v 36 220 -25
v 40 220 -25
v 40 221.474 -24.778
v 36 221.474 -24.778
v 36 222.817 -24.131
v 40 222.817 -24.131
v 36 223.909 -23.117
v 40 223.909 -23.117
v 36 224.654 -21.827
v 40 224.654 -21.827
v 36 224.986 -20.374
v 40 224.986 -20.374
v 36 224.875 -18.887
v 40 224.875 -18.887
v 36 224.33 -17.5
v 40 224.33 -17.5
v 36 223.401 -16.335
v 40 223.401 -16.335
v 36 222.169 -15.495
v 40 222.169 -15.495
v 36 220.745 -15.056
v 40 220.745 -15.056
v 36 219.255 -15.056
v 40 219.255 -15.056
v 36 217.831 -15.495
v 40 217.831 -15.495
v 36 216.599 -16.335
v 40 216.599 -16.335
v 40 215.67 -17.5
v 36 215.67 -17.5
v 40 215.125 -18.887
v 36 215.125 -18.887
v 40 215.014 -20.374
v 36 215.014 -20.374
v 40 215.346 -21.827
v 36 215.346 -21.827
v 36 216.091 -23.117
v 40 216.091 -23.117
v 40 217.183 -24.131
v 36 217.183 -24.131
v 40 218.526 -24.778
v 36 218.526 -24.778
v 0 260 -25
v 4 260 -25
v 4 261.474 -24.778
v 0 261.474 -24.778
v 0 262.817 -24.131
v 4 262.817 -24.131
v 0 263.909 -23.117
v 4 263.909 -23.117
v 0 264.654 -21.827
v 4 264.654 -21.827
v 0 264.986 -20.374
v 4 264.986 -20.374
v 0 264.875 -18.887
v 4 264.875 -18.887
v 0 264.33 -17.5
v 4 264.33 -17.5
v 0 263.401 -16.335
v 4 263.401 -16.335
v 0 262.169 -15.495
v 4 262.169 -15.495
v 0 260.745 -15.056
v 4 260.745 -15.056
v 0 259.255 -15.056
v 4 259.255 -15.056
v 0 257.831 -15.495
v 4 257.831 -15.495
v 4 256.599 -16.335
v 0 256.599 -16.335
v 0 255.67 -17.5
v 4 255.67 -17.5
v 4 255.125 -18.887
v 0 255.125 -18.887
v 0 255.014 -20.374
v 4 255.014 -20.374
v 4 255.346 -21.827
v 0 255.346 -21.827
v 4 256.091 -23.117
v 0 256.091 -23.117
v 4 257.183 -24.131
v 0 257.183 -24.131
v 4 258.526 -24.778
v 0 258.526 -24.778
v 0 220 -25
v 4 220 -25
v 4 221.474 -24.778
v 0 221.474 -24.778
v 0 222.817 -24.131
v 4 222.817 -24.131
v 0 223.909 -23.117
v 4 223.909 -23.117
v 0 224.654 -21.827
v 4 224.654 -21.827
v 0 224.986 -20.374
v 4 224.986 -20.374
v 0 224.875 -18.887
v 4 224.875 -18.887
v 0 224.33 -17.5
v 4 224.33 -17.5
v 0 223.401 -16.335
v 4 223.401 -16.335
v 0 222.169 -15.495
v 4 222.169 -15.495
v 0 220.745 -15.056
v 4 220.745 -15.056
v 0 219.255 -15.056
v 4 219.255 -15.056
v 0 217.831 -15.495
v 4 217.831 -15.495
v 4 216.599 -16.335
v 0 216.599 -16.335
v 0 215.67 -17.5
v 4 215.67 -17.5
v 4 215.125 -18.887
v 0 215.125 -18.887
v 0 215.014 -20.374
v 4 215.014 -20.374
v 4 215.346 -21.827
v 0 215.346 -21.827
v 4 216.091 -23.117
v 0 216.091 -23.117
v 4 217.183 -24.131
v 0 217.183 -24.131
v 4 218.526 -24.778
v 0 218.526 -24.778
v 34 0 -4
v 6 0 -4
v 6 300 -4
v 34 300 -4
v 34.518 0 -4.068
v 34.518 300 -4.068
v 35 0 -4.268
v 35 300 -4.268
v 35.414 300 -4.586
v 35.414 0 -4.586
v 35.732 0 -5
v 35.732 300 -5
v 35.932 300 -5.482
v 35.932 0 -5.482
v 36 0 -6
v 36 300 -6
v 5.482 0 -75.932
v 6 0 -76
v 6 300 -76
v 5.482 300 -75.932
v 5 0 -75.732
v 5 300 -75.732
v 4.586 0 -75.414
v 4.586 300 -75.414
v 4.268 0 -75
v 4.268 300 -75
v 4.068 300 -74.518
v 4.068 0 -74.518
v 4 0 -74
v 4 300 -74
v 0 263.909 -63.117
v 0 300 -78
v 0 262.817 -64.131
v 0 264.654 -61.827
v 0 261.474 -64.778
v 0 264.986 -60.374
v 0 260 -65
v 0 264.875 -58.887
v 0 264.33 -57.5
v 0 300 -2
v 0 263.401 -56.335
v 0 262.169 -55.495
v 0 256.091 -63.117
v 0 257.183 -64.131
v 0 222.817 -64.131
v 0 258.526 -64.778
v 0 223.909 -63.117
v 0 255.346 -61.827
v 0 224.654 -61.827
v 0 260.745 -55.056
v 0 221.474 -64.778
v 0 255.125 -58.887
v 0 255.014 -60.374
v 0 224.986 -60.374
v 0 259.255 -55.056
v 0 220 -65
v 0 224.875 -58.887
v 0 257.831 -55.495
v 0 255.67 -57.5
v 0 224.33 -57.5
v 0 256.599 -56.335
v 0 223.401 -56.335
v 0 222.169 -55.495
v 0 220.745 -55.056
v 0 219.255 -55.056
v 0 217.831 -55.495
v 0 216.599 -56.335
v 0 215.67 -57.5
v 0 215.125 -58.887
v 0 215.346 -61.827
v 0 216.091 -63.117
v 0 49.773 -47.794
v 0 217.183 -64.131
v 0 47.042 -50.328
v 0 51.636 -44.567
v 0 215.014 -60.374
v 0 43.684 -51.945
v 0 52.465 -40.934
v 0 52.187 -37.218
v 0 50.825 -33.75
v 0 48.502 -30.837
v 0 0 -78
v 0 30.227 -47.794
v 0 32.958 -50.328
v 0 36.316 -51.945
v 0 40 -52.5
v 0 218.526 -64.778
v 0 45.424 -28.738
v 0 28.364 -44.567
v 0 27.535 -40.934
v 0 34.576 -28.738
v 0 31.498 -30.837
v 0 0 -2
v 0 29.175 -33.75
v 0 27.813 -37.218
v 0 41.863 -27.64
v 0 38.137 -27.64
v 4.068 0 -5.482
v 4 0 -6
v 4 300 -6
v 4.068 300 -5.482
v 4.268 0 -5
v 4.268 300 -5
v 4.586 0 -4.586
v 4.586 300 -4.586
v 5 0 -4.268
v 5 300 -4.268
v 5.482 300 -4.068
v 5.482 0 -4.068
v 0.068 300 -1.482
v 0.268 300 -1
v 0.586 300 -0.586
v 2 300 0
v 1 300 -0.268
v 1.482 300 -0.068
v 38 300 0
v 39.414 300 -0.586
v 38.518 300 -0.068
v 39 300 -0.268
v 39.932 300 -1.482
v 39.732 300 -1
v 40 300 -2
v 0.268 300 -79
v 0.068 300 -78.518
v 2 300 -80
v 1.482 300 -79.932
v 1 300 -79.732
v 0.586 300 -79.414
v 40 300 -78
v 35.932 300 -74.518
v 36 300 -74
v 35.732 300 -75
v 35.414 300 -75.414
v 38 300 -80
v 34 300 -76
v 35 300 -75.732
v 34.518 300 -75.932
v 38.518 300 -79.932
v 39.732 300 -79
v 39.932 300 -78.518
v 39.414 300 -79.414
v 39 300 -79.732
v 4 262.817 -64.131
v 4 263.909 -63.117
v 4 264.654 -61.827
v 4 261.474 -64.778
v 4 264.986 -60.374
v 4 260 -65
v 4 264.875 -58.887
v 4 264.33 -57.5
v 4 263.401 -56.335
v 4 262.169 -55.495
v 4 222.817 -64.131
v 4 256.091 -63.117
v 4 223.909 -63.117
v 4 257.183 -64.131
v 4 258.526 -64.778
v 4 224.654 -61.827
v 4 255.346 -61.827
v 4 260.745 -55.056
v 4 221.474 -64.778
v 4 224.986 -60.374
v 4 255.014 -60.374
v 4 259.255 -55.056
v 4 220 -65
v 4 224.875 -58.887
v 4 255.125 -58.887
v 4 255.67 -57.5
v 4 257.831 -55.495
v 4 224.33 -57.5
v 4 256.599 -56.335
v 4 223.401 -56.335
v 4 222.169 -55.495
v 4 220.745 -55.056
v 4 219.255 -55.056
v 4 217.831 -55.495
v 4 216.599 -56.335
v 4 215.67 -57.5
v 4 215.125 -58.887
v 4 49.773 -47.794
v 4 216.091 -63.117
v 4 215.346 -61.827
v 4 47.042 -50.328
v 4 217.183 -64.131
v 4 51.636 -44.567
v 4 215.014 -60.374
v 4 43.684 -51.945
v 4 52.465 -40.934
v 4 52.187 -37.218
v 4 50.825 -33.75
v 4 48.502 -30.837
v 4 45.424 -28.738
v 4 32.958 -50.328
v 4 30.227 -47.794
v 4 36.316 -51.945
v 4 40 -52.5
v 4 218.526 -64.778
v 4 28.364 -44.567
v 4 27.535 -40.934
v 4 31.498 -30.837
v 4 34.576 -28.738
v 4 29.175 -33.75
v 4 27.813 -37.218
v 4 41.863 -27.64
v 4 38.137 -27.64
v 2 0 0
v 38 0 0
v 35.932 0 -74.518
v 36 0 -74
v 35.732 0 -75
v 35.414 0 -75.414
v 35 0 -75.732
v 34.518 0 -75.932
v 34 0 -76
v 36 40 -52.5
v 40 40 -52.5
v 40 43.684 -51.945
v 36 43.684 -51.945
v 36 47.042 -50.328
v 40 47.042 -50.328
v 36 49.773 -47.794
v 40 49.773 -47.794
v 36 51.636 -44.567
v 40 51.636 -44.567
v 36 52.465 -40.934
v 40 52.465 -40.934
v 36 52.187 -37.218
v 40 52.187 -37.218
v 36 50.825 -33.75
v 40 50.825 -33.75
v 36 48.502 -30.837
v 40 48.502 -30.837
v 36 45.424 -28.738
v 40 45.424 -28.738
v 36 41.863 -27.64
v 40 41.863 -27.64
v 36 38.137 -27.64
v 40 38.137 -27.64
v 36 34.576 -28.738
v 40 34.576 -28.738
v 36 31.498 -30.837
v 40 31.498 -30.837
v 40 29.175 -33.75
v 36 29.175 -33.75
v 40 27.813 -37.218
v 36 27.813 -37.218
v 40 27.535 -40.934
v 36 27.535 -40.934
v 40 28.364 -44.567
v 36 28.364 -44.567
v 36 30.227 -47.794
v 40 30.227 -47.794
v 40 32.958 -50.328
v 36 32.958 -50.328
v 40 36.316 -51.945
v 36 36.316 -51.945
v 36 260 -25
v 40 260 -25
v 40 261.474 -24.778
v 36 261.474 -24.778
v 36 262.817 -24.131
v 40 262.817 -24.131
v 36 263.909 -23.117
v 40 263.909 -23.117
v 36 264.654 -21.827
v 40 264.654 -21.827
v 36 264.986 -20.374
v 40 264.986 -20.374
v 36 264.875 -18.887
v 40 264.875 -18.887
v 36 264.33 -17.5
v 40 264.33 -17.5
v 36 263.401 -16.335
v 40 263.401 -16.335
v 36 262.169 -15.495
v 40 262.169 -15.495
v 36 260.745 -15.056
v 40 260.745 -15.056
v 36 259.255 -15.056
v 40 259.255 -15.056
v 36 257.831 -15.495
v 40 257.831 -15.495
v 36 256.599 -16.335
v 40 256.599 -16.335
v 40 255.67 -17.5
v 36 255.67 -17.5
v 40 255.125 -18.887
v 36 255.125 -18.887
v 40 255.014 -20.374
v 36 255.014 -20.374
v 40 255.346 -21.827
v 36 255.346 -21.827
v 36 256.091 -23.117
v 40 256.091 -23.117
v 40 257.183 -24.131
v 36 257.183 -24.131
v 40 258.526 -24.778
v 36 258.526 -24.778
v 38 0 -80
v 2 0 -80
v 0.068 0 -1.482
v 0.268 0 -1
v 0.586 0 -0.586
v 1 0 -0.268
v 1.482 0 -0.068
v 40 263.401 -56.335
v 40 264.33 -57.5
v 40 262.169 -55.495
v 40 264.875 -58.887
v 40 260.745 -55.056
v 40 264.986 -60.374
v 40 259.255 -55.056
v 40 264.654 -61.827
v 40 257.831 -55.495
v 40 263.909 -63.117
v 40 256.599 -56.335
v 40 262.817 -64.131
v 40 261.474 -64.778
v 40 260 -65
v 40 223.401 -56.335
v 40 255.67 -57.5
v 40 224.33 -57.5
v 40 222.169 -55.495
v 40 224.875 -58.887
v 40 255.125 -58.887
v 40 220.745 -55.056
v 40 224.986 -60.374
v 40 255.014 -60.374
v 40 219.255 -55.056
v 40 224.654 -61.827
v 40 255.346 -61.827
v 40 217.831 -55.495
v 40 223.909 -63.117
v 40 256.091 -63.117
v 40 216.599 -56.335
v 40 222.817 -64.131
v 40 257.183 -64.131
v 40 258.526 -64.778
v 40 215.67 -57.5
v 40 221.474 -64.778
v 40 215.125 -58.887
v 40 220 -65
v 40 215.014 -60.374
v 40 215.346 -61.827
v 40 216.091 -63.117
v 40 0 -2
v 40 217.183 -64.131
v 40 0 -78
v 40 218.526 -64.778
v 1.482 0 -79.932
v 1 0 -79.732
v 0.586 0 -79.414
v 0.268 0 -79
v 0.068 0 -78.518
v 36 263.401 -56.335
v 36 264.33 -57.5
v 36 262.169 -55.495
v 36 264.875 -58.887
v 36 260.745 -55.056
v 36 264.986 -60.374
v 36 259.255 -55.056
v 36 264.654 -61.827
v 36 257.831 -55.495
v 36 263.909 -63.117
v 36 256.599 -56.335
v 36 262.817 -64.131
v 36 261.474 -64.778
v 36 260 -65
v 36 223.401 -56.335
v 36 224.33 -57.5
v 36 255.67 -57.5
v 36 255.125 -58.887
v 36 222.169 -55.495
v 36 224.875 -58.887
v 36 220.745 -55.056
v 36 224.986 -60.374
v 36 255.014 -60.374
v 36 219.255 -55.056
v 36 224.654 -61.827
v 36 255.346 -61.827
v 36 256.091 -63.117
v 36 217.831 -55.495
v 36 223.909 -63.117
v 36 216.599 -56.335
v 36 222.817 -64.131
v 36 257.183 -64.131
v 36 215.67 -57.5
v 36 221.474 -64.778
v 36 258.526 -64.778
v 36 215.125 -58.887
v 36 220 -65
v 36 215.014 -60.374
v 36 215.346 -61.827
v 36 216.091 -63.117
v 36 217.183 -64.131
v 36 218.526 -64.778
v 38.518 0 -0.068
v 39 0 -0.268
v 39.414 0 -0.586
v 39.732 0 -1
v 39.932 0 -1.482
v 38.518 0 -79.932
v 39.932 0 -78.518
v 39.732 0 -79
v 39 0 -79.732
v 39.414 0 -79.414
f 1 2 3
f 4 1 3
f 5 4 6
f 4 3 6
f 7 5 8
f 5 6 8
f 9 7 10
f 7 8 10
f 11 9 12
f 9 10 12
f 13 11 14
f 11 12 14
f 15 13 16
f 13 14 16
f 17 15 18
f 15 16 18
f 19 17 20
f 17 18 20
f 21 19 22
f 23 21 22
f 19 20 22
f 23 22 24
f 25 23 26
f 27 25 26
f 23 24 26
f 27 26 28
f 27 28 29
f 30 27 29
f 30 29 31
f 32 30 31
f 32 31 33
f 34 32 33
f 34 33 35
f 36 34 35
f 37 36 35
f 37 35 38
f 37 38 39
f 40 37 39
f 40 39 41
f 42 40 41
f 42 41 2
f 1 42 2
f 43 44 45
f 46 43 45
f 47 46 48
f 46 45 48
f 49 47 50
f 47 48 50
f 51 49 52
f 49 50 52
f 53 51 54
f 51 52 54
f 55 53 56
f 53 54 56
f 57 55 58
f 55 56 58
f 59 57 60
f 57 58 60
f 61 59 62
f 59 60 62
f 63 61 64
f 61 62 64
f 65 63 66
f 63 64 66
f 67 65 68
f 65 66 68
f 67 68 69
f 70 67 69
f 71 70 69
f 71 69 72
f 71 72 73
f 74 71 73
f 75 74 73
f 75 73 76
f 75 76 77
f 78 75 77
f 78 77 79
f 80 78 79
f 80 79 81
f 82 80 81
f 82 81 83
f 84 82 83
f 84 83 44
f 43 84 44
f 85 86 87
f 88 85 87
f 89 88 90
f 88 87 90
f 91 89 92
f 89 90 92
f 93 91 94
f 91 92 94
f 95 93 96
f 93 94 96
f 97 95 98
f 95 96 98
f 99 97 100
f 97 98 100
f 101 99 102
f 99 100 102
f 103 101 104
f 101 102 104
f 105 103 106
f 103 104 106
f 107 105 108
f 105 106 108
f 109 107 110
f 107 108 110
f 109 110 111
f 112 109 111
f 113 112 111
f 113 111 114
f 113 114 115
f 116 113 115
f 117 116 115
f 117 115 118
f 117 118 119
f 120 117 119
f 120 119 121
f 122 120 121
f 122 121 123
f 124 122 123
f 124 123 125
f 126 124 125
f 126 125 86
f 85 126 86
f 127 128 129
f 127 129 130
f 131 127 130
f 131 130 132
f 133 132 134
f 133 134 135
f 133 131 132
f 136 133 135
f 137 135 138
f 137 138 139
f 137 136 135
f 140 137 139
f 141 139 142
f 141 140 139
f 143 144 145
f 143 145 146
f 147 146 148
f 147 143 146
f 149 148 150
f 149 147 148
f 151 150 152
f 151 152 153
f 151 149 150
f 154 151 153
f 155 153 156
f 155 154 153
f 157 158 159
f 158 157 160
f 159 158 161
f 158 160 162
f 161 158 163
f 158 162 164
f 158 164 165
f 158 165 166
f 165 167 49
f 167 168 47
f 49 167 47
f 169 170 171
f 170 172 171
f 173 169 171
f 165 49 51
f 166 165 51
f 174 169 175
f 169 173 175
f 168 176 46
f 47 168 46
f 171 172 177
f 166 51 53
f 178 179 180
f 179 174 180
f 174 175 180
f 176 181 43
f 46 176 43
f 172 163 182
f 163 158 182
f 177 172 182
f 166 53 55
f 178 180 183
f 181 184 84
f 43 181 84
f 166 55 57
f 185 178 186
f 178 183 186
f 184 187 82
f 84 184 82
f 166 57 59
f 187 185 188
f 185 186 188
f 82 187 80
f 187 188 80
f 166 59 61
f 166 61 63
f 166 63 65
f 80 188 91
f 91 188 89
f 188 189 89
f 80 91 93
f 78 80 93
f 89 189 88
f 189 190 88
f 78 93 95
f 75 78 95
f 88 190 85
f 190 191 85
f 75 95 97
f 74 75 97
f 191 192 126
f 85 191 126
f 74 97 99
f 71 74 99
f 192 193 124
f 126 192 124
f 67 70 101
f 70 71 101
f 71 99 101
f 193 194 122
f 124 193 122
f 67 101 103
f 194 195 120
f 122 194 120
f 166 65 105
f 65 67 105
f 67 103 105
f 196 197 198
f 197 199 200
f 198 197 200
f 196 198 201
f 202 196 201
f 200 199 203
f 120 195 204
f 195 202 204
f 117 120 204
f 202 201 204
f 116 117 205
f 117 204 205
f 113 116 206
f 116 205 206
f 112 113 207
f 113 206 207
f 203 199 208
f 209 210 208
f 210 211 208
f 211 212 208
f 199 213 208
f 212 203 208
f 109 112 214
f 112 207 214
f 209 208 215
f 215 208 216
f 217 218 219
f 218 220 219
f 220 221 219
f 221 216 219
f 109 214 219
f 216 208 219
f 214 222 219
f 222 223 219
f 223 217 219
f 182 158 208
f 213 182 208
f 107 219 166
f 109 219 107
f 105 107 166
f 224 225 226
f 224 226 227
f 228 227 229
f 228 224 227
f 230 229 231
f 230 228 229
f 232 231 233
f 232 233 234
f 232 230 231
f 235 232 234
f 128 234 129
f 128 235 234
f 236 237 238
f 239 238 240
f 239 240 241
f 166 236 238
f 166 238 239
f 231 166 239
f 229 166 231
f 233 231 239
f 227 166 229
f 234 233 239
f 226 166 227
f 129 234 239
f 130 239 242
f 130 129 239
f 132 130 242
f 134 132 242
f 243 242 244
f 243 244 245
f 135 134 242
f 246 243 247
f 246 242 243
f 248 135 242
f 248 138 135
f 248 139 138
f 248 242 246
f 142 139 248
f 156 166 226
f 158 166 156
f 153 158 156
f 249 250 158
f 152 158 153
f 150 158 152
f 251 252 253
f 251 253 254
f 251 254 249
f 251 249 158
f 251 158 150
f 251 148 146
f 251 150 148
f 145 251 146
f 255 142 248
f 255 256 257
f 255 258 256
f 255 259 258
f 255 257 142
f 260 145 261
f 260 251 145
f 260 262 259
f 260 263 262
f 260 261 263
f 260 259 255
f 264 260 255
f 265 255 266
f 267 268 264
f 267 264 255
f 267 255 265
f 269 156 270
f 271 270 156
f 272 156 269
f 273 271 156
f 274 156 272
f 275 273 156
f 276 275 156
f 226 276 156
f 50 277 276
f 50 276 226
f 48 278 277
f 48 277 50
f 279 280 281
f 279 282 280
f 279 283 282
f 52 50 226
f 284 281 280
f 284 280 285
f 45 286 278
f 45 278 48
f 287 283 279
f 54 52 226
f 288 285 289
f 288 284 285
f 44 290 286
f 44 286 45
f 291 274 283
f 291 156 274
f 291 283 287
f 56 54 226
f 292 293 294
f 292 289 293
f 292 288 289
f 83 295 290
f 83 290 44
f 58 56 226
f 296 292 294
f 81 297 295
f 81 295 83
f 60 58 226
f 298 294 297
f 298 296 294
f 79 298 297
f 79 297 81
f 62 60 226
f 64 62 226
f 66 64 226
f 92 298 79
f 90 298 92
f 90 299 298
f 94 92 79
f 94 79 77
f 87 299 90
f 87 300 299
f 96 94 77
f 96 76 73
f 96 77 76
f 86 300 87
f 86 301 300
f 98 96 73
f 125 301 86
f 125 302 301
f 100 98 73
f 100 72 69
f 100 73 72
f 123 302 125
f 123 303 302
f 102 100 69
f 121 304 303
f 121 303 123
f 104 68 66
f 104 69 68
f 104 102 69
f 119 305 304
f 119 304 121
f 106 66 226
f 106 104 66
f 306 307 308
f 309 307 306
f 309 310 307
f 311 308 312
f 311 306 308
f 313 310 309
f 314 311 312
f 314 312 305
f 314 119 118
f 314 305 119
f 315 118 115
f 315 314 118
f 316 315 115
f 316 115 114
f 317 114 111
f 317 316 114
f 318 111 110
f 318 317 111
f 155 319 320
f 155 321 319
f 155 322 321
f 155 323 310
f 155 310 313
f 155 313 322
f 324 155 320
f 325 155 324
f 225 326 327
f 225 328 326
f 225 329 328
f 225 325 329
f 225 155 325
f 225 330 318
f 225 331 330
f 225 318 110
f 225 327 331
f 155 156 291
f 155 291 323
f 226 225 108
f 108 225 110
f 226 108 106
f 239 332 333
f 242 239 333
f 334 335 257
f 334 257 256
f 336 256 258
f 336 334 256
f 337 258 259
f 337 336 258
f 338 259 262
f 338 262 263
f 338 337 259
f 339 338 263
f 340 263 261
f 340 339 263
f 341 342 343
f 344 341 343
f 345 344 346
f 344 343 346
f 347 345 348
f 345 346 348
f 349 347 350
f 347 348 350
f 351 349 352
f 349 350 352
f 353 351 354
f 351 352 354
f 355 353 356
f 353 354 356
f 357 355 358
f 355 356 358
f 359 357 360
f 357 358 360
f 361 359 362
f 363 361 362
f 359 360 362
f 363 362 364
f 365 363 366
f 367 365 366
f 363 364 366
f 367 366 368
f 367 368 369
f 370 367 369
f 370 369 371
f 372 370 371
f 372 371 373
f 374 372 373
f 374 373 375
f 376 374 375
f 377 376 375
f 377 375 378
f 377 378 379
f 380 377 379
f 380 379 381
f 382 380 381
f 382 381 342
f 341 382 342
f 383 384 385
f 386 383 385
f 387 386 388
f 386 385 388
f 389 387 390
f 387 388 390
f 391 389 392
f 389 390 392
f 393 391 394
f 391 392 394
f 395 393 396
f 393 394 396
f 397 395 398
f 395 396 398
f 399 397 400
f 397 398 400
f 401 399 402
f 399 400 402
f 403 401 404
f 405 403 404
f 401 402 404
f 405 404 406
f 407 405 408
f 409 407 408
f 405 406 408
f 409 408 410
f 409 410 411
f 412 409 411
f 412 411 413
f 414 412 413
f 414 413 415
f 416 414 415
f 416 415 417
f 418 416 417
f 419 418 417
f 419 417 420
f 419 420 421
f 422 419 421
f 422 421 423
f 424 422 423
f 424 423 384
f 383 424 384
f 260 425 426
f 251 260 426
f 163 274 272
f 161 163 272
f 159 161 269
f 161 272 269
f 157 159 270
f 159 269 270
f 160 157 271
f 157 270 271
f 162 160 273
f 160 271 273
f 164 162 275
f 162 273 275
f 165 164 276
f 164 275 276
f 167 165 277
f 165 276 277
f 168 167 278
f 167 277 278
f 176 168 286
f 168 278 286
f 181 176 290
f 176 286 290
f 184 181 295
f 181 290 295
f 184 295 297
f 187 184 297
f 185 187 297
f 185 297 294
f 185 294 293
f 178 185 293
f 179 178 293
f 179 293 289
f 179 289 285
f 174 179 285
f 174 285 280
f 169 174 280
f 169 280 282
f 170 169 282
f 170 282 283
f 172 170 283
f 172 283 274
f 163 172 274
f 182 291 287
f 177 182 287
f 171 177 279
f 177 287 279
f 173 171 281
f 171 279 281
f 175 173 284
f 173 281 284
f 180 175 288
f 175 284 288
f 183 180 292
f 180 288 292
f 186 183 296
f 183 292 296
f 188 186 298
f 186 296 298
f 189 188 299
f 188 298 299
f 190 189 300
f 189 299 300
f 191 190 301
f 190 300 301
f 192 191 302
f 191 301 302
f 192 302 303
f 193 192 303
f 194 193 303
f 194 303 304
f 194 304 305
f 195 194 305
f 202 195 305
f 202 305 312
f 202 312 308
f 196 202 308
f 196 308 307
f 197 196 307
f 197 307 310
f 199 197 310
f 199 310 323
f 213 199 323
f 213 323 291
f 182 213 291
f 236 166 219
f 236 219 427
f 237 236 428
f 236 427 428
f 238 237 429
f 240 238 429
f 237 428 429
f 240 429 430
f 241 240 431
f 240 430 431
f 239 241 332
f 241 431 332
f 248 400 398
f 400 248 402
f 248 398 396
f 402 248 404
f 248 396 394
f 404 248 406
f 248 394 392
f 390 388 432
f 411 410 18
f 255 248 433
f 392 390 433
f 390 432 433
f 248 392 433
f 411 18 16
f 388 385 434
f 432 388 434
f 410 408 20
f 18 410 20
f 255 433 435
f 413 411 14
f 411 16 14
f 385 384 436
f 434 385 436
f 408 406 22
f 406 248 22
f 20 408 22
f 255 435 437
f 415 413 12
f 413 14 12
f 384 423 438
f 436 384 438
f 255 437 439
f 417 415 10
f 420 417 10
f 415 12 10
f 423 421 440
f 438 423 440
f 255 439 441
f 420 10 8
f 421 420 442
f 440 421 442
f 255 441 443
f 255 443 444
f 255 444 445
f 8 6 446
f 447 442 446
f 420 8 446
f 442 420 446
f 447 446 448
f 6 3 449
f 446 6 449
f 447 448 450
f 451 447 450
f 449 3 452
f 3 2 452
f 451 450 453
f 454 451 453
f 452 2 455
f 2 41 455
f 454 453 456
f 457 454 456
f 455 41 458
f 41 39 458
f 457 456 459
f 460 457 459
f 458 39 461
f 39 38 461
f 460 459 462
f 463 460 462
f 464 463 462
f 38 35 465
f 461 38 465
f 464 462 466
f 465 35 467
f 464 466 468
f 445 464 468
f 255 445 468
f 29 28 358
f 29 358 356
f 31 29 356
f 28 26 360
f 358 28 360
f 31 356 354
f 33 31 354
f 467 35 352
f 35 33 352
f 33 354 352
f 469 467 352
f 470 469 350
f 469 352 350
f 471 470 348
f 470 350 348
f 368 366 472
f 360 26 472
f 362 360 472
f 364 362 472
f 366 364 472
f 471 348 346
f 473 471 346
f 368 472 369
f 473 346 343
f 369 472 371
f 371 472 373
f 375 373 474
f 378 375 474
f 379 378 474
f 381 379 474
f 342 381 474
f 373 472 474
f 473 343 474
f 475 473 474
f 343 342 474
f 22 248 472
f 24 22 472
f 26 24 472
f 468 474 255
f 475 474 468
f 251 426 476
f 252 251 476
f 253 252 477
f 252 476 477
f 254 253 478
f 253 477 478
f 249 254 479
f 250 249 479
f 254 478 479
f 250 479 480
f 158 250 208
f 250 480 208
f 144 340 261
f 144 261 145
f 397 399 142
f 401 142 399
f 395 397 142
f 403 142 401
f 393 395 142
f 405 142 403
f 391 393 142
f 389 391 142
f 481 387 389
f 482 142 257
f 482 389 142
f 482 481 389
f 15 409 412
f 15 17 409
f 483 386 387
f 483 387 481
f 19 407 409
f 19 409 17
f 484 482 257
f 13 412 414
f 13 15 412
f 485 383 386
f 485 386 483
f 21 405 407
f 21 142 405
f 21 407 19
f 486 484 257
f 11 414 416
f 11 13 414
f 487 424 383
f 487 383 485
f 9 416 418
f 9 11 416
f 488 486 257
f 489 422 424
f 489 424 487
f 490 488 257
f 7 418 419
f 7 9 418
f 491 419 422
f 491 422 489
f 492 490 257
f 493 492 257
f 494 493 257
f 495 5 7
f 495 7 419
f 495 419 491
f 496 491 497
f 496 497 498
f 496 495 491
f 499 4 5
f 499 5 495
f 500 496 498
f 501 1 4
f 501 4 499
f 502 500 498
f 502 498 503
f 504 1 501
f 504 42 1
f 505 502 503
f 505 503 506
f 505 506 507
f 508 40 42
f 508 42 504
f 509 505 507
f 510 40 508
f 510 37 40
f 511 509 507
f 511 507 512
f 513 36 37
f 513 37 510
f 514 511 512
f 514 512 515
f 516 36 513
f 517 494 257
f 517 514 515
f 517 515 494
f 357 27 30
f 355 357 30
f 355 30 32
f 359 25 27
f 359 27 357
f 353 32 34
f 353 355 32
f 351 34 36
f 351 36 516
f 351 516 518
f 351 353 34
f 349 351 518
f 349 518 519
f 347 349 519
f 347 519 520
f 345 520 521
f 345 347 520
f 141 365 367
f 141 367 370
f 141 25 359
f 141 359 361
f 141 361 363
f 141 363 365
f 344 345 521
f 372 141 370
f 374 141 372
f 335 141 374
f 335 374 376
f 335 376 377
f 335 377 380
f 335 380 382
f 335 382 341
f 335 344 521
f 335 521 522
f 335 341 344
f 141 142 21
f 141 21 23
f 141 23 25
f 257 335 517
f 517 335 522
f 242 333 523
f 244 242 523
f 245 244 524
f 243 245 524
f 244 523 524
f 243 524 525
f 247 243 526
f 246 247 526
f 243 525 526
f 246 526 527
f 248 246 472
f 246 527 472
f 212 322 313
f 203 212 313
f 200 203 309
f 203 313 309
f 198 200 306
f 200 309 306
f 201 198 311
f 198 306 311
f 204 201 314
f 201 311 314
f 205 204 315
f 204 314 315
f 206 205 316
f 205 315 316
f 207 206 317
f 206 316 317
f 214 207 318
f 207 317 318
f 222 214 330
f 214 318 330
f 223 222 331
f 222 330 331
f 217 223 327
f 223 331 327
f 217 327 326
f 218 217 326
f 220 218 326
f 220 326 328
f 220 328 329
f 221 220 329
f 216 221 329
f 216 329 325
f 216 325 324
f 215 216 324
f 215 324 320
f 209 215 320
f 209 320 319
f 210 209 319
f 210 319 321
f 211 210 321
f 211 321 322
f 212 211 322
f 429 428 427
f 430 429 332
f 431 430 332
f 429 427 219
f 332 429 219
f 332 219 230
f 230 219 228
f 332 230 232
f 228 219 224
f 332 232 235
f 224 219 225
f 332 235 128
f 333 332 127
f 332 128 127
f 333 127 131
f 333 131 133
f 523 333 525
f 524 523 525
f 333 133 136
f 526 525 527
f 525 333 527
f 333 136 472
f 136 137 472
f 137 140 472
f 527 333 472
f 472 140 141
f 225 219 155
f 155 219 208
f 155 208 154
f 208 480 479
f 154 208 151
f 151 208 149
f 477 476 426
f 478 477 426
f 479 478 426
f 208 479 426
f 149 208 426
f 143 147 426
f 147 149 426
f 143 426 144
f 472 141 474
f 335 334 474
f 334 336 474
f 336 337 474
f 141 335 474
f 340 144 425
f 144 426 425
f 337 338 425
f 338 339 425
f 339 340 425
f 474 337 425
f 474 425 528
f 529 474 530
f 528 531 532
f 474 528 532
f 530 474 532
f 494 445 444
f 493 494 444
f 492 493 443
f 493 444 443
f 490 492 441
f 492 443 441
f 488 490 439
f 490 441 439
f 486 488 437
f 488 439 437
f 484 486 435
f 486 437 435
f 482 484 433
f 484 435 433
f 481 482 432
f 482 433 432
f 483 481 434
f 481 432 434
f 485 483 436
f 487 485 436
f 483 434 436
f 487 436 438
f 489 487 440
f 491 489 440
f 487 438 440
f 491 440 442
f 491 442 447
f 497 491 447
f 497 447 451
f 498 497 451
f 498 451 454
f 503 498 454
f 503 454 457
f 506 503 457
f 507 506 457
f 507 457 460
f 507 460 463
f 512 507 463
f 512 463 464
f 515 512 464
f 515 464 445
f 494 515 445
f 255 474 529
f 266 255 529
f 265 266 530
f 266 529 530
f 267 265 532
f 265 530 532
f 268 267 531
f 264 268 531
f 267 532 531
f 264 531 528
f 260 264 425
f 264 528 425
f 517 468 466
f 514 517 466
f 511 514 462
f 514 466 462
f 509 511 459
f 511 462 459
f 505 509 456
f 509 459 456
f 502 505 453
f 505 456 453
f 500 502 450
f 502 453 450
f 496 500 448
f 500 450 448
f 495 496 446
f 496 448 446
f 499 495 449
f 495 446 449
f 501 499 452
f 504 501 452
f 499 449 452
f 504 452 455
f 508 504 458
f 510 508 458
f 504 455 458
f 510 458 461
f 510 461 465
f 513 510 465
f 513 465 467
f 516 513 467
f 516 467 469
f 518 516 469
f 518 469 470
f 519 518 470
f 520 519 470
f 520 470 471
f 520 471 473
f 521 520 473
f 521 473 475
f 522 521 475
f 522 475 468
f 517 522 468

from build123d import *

# Parameters (mm, degrees)
BOSS_EXTRU_1_DEPTH      = 300
ESQUISSE3_R             = 12.5
ENL_V_MAT_EXTRU_1_DEPTH = 314.04951685
ESQUISSE4_R             = 5
ENL_V_MAT_EXTRU_2_DEPTH = 314.04951685


with BuildPart() as part:
    # Esquisse2 → Boss.-Extru.1 (new body)
    with BuildSketch(Plane(origin=(0, 0, 0), x_dir=(1, 0, 0), z_dir=(0, 1, 0))):
        with BuildLine():
            Line((2, 0), (38, 0))
            ThreePointArc((38, 0), (39.414213562, 0.585786438), (40, 2))
            Line((40, 2), (40, 78))
            ThreePointArc((40, 78), (39.414213562, 79.414213562), (38, 80))
            Line((38, 80), (2, 80))
            ThreePointArc((2, 80), (0.585786438, 79.414213562), (0, 78))
            Line((0, 78), (0, 2))
            ThreePointArc((0, 2), (0.585786438, 0.585786438), (2, 0))
        make_face()
        with BuildLine():
            Line((6, 4), (34, 4))
            ThreePointArc((34, 4), (35.414213562, 4.585786438), (36, 6))
            Line((36, 6), (36, 74))
            ThreePointArc((36, 74), (35.414213562, 75.414213562), (34, 76))
            Line((34, 76), (6, 76))
            ThreePointArc((6, 76), (4.585786438, 75.414213562), (4, 74))
            Line((4, 74), (4, 6))
            ThreePointArc((4, 6), (4.585786438, 4.585786438), (6, 4))
        make_face(mode=Mode.SUBTRACT)
    extrude(amount=BOSS_EXTRU_1_DEPTH)

    # Esquisse3 → Enlèv. mat.-Extru.1 (cut, through all)
    with BuildSketch(Plane(origin=(40, 0, 0), x_dir=(0, 0, -1), z_dir=(1, 0, 0))):
        with Locations((40, 40)):
            Circle(ESQUISSE3_R)
    extrude(amount=-ENL_V_MAT_EXTRU_1_DEPTH, mode=Mode.SUBTRACT)

    # Esquisse4 → Enlèv. mat.-Extru.2 (cut, through all)
    with BuildSketch(Plane(origin=(40, 0, 0), x_dir=(0, 0, -1), z_dir=(1, 0, 0))):
        with Locations((60, 220)):
            Circle(ESQUISSE4_R)
        with Locations((20, 220)):
            Circle(ESQUISSE4_R)
        with Locations((20, 260)):
            Circle(ESQUISSE4_R)
        with Locations((60, 260)):
            Circle(ESQUISSE4_R)
    extrude(amount=-ENL_V_MAT_EXTRU_2_DEPTH, mode=Mode.SUBTRACT)


solid = part.part
